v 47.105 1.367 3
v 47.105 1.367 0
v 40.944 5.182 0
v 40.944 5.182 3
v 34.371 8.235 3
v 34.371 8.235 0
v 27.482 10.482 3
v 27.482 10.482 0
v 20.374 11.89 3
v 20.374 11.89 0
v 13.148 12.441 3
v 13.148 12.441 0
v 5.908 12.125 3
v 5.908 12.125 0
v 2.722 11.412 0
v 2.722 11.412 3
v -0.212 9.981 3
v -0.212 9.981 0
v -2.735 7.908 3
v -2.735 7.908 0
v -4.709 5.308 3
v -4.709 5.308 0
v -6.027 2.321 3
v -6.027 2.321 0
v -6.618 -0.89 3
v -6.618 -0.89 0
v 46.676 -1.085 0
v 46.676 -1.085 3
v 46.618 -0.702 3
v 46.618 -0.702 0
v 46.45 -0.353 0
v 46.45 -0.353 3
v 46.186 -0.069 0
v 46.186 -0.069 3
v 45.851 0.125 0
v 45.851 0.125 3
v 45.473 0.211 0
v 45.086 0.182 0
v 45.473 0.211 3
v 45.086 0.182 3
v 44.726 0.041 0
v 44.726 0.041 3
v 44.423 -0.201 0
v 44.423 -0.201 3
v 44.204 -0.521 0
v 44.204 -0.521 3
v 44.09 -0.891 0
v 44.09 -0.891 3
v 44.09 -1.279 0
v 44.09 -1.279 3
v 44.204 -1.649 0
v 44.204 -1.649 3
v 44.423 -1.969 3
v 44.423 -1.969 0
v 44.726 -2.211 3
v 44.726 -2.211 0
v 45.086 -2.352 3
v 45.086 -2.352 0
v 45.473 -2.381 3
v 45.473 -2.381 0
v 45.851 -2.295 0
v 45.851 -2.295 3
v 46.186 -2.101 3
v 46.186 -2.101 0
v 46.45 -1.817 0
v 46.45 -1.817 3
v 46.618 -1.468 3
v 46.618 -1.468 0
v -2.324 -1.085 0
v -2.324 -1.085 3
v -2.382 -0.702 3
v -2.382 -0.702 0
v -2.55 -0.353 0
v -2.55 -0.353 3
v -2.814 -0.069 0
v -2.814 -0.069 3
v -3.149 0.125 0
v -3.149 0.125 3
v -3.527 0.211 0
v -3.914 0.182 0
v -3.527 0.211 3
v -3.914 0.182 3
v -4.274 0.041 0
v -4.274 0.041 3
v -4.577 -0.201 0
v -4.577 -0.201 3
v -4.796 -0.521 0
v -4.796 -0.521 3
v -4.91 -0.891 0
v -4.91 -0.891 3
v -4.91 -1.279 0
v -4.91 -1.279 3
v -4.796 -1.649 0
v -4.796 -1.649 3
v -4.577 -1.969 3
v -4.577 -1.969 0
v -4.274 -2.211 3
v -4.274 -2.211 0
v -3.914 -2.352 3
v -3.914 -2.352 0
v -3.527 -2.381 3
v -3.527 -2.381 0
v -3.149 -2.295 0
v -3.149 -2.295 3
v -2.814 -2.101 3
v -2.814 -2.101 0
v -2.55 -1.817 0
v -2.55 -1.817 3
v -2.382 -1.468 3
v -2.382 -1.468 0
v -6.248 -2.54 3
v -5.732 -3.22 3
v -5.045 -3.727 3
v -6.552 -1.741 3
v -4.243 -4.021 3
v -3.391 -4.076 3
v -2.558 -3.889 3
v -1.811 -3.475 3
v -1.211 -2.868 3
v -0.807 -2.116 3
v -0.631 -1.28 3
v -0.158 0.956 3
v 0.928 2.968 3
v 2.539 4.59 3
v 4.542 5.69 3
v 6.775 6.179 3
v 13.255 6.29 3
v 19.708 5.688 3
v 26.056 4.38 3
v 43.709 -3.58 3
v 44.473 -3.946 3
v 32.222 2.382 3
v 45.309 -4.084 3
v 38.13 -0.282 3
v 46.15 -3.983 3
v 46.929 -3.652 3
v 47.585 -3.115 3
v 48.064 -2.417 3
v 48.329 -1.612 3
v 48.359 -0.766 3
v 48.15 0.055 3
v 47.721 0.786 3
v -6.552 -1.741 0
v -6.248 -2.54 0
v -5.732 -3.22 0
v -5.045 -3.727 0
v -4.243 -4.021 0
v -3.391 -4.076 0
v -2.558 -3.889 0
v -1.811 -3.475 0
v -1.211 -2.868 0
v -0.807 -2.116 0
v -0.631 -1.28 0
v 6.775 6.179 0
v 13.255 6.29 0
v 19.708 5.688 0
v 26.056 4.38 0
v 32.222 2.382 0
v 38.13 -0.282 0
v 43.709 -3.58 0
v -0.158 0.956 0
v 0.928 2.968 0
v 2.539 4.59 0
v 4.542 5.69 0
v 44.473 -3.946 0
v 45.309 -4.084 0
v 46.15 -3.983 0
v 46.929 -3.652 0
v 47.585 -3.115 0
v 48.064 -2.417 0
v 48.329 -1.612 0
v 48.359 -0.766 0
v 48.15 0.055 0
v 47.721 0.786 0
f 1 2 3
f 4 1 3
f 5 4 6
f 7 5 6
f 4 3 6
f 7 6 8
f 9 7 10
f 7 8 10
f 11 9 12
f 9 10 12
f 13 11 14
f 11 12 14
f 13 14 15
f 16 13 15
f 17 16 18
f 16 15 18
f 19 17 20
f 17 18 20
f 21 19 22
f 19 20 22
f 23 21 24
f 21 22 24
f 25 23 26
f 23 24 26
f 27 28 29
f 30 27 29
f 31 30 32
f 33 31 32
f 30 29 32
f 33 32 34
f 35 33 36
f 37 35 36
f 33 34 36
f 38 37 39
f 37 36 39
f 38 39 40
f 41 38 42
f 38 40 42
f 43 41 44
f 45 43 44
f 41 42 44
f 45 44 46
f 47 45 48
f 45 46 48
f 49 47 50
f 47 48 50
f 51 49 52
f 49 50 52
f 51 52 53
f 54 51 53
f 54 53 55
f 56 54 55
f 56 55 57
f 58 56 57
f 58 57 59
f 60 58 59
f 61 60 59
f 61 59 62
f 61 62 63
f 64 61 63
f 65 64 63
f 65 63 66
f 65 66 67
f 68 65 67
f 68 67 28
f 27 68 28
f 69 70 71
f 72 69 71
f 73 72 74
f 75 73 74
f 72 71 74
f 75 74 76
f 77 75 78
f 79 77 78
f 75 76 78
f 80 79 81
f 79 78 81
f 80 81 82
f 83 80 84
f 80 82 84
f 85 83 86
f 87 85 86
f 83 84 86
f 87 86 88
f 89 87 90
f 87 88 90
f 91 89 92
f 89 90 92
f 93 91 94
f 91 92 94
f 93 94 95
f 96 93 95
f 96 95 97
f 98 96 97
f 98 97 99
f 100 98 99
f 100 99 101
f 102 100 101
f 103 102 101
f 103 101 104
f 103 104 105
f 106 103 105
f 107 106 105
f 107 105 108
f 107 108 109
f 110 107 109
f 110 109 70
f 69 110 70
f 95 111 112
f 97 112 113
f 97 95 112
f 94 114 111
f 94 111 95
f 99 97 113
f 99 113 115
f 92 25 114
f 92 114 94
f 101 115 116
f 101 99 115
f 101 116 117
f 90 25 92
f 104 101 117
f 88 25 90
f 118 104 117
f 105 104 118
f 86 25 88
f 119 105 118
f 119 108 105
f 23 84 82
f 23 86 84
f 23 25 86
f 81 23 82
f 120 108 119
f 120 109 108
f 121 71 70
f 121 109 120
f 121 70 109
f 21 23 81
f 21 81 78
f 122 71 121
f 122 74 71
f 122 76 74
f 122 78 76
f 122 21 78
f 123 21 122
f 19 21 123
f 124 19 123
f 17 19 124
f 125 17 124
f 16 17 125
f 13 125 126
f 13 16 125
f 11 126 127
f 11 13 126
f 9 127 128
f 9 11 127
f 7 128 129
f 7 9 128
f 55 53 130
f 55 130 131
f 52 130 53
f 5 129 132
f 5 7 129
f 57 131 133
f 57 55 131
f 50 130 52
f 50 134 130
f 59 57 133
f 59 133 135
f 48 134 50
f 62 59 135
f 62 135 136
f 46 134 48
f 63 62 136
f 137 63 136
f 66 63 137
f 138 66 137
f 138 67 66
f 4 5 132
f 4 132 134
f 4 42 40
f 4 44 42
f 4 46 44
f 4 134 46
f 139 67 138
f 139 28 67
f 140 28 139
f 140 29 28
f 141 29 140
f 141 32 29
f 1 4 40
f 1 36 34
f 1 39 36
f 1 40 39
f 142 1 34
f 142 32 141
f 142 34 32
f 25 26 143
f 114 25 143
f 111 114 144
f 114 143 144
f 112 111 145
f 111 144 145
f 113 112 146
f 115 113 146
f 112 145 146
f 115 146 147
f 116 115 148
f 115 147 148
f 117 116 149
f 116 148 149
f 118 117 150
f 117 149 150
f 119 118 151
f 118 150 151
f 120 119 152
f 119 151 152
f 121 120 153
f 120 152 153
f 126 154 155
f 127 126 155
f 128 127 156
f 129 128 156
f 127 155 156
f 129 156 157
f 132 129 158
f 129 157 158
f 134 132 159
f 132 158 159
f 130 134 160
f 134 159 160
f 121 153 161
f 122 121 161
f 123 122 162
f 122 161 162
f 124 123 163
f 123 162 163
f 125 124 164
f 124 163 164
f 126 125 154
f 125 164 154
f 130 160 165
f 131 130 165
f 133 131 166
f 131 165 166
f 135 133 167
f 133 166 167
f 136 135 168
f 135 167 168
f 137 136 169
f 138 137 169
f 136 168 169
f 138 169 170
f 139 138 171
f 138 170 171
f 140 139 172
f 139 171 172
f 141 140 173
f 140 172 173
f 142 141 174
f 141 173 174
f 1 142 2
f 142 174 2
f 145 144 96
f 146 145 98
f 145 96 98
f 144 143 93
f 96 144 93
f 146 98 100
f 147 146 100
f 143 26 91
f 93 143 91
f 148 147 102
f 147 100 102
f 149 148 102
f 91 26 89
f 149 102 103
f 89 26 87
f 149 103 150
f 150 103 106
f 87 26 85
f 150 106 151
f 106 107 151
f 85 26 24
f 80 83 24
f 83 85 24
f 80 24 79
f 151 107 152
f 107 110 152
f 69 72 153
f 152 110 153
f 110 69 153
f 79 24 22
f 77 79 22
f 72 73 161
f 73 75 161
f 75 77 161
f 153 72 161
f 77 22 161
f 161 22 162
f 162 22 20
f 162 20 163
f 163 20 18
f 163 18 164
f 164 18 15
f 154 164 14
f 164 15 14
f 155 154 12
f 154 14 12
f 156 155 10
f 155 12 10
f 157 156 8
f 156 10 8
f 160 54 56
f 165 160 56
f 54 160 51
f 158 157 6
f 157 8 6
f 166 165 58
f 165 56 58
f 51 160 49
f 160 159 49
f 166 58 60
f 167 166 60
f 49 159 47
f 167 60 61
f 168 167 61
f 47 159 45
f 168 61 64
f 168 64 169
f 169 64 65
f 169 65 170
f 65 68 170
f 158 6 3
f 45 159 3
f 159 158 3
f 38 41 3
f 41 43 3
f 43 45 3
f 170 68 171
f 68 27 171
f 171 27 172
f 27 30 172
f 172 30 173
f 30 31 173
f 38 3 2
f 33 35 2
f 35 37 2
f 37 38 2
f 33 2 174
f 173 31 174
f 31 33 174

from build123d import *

# Parameters (mm, degrees)
EXTRUDE_1_DEPTH     = 3
SKETCH_2_R          = 1.3
CUT_EXTRUDE_1_DEPTH = 4


with BuildPart() as part:
    # 스케치1 → 보스-돌출1 (new body)
    with BuildSketch(Plane.XY):
        with BuildLine():
            ThreePointArc((5.908095924, 12.125440592), (-2.734946833, 7.908149395), (-6.618010934, -0.890120111))
            ThreePointArc((-6.618010934, -0.890120111), (-3.819295692, -4.078723723), (-0.63069208, -1.280008481))
            ThreePointArc((-0.63069208, -1.280008481), (1.675267899, 3.836644085), (6.775226967, 6.179292672))
            ThreePointArc((6.775226967, 6.179292672), (26.056169451, 4.379851204), (43.709409242, -3.57978808))
            ThreePointArc((43.709409242, -3.57978808), (47.849012899, -2.782847709), (47.104702299, 1.366541899))
            ThreePointArc((47.104702299, 1.366541899), (27.481967947, 10.481515342), (5.908095924, 12.125440592))
        make_face()
    extrude(amount=EXTRUDE_1_DEPTH)

    # 스케치2 → 컷-돌출1 (cut, through all)
    with BuildSketch(Plane.XY.offset(3)):
        with Locations((-3.624351507, -1.085064296)):
            Circle(SKETCH_2_R)
        with Locations((45.375648493, -1.085064296)):
            Circle(SKETCH_2_R)
    extrude(amount=-CUT_EXTRUDE_1_DEPTH, mode=Mode.SUBTRACT)


solid = part.part
